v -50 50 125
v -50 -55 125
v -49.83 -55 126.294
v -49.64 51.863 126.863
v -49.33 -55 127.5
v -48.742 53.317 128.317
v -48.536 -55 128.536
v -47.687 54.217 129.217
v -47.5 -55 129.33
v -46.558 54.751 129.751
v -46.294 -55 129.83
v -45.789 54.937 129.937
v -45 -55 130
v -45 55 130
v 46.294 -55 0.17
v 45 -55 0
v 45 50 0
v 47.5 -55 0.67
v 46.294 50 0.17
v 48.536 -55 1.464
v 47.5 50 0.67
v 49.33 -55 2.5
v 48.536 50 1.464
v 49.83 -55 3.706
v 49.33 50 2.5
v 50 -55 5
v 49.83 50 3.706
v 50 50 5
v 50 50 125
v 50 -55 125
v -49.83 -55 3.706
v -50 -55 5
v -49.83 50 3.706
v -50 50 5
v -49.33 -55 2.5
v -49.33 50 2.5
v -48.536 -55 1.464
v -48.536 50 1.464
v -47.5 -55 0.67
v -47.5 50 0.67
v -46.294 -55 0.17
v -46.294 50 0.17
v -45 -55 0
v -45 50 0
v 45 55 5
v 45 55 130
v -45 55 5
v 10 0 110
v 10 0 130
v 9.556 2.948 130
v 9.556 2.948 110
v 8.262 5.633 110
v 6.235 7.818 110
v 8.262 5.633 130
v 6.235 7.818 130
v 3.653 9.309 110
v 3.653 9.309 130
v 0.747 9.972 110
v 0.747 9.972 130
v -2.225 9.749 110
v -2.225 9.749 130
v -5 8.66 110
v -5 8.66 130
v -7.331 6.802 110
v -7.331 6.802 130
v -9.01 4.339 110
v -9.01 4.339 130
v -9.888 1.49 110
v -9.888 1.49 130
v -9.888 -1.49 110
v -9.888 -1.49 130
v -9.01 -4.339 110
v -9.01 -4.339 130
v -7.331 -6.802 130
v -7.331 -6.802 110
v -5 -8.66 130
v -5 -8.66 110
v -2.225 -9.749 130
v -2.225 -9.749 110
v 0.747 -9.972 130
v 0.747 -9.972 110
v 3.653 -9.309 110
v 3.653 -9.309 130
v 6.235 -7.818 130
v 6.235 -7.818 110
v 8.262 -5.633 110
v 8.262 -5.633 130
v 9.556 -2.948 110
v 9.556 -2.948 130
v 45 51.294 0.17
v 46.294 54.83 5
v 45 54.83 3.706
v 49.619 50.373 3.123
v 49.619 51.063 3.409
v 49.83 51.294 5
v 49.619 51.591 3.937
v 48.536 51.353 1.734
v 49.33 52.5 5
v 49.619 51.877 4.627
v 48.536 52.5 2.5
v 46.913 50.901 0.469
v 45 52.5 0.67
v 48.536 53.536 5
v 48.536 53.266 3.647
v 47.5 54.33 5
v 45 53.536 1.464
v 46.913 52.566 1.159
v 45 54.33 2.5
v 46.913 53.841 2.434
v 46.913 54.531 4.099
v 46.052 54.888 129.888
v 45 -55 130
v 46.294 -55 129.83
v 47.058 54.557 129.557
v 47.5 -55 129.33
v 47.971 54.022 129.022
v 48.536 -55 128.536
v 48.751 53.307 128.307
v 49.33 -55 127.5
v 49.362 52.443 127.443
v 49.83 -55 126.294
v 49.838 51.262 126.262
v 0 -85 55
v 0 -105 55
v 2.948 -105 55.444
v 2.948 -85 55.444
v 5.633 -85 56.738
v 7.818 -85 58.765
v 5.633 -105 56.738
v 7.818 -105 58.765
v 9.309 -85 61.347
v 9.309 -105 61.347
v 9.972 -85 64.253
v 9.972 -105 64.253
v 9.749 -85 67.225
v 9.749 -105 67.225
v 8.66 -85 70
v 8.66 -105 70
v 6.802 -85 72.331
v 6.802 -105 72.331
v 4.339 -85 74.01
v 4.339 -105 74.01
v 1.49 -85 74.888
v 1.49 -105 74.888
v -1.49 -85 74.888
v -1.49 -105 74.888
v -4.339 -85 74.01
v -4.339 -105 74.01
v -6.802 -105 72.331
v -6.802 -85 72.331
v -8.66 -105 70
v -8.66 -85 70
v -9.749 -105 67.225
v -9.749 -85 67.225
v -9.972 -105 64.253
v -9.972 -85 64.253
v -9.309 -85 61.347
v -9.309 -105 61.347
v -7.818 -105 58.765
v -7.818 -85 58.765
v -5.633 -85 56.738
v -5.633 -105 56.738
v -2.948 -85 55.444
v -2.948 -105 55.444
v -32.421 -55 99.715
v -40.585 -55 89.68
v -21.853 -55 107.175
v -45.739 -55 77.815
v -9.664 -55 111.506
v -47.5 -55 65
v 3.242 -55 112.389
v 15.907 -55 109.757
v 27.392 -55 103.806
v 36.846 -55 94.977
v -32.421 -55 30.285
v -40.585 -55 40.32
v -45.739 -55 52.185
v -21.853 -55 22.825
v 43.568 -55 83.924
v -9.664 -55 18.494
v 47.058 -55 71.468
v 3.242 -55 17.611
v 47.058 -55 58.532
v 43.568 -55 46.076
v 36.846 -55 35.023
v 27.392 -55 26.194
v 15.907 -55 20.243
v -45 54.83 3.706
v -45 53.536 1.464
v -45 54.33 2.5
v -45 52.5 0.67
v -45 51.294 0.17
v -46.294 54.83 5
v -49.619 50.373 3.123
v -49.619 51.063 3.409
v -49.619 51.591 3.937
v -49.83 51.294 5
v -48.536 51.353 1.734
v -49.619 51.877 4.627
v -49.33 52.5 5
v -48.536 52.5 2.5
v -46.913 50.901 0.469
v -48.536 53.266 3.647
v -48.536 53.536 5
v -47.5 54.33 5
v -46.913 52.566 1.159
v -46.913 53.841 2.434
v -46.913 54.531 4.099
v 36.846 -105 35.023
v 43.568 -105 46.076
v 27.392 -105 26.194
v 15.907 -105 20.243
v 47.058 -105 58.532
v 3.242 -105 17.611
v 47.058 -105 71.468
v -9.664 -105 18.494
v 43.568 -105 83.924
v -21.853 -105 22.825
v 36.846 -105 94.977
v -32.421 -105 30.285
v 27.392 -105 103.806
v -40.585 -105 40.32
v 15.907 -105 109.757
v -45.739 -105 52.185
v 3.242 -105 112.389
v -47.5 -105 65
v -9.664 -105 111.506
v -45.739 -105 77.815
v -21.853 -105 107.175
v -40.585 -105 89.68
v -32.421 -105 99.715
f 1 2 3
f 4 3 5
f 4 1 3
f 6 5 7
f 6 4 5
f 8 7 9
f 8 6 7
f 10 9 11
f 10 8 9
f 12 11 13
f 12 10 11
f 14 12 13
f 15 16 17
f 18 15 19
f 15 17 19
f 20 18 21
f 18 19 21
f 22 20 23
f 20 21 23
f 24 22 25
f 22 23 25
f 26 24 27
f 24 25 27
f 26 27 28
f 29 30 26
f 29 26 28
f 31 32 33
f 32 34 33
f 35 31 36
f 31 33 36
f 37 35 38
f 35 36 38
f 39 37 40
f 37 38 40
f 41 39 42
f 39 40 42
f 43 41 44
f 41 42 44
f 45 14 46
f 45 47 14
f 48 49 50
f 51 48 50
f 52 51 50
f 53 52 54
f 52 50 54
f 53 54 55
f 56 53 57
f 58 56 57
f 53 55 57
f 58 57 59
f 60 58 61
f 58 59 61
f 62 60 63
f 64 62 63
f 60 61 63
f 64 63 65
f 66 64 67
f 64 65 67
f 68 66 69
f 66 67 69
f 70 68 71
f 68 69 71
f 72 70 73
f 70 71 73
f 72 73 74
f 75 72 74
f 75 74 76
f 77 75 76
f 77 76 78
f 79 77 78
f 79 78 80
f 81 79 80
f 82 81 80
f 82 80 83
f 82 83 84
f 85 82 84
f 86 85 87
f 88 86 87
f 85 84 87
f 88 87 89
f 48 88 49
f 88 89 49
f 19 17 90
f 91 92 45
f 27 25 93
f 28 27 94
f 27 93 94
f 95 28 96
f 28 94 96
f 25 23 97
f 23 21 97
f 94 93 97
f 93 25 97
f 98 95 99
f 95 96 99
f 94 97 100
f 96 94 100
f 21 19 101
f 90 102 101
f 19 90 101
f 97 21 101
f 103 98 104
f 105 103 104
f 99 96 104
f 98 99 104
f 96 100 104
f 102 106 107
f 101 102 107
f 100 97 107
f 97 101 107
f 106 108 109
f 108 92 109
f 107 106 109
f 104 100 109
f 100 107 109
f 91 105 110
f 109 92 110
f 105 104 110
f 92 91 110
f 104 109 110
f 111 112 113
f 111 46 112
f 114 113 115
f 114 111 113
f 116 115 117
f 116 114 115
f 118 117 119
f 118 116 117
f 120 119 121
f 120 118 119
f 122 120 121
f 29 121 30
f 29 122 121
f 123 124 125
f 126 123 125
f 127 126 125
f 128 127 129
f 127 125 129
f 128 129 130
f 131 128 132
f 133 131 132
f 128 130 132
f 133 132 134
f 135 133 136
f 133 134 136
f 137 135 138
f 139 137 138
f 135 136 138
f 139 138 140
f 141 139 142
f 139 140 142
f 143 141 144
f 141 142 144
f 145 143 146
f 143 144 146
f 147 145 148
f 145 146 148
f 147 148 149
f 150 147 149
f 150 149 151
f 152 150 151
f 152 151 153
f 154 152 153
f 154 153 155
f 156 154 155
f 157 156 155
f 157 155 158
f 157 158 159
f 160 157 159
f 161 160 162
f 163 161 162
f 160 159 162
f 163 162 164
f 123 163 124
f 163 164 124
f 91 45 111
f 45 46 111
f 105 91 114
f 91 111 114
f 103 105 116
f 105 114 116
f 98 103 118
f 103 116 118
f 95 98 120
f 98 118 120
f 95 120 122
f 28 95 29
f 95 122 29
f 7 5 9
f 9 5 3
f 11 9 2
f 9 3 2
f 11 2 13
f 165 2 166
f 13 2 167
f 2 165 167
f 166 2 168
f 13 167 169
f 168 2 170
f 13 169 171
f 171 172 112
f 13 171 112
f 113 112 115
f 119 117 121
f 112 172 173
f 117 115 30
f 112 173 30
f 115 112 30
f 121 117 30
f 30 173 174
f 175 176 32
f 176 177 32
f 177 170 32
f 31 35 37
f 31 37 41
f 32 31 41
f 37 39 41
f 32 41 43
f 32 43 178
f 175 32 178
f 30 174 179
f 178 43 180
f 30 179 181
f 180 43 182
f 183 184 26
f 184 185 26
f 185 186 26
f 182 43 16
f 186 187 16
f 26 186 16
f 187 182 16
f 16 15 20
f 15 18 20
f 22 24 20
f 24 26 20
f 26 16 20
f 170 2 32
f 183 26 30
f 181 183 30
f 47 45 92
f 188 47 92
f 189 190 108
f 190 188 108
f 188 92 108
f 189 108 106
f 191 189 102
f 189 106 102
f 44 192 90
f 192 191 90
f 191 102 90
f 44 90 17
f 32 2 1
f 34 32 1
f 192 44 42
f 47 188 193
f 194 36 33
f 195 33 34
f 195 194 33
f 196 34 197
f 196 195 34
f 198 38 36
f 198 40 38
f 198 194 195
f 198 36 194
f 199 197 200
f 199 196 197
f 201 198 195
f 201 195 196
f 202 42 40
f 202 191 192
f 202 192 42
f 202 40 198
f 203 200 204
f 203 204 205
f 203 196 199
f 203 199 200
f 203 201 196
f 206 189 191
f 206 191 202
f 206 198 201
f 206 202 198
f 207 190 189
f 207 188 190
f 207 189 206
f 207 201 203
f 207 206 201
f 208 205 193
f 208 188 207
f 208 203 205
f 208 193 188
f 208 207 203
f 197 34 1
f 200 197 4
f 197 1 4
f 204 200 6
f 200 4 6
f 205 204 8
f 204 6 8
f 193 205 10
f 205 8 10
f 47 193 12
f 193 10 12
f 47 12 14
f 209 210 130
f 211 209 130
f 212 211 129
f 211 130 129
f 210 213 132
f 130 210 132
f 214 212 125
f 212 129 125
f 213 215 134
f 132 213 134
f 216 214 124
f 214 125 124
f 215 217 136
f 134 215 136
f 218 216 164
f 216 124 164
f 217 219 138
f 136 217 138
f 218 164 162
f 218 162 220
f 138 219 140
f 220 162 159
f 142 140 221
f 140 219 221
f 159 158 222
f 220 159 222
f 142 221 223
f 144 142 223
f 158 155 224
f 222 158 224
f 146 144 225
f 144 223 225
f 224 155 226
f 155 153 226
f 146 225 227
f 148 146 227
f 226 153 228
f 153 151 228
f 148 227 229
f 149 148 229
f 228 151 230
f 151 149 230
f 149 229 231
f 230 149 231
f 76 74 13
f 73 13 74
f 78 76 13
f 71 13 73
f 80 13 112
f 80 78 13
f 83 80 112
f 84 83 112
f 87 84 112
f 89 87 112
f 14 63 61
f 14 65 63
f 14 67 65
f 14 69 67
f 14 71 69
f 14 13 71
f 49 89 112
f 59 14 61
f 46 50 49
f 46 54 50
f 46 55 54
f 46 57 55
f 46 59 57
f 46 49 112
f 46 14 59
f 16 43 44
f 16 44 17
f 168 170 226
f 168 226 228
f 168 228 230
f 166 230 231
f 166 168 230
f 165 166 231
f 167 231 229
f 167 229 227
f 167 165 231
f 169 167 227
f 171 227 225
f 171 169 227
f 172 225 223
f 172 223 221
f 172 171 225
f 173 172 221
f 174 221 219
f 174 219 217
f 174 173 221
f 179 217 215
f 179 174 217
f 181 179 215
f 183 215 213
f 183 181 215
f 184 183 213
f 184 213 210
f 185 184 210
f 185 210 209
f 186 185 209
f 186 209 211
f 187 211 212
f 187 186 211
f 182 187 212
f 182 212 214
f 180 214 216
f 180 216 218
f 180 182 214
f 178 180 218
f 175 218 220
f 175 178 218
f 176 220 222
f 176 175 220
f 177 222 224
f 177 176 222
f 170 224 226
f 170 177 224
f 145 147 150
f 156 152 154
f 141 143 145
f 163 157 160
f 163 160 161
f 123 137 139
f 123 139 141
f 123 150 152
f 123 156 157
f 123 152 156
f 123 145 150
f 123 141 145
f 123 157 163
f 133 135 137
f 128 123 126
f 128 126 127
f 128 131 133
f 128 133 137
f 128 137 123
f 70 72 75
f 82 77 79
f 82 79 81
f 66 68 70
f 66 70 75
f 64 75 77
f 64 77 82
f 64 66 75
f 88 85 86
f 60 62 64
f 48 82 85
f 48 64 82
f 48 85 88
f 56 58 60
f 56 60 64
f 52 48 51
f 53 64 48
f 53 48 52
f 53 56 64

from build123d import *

# Parameters (mm, degrees)
SKETCH1_W           = 100
SKETCH1_H           = 110
BOSS_EXTRUDE1_DEPTH = 130
SKETCH2_R           = 47.5
BOSS_EXTRUDE2_DEPTH = 50
SKETCH4_R           = 10
CUT_EXTRUDE3_DEPTH  = 20
SKETCH5_R           = 10
CUT_EXTRUDE4_DEPTH  = 20
FILLET1_R           = 5


with BuildPart() as part:
    # Sketch1 → Boss-Extrude1 (new body)
    with BuildSketch(Plane.XY):
        Rectangle(SKETCH1_W, SKETCH1_H)
    extrude(amount=BOSS_EXTRUDE1_DEPTH)

    # Sketch2 → Boss-Extrude2 (add)
    with BuildSketch(Plane(origin=(0, -55, 0), x_dir=(1, 0, 0), z_dir=(0, 1, 0))):
        with Locations(Location((0, -65, 0), (0, 0, 180))):
            Circle(SKETCH2_R)
    extrude(amount=-BOSS_EXTRUDE2_DEPTH)

    # Sketch4 → Cut-Extrude3 (cut)
    with BuildSketch(Plane.XZ.offset(105)):
        with Locations(Location((0, 65, 0), (0, 0, 270))):
            Circle(SKETCH4_R)
    extrude(amount=-CUT_EXTRUDE3_DEPTH, mode=Mode.SUBTRACT)

    # Sketch5 → Cut-Extrude4 (cut)
    with BuildSketch(Plane.XY.offset(130)):
        Circle(SKETCH5_R)
    extrude(amount=-CUT_EXTRUDE4_DEPTH, mode=Mode.SUBTRACT)

    # Fillet1
    fillet1_edges = [part.edges().sort_by_distance(p)[0] for p in [
        (50, 0, 130),
        (-50, 0, 130),
        (0, 55, 0),
        (50, 0, 0),
        (-50, 0, 0),
        (-50, 55, 65),
        (50, 55, 65),
    ]]
    fillet(fillet1_edges, radius=FILLET1_R)


solid = part.part
